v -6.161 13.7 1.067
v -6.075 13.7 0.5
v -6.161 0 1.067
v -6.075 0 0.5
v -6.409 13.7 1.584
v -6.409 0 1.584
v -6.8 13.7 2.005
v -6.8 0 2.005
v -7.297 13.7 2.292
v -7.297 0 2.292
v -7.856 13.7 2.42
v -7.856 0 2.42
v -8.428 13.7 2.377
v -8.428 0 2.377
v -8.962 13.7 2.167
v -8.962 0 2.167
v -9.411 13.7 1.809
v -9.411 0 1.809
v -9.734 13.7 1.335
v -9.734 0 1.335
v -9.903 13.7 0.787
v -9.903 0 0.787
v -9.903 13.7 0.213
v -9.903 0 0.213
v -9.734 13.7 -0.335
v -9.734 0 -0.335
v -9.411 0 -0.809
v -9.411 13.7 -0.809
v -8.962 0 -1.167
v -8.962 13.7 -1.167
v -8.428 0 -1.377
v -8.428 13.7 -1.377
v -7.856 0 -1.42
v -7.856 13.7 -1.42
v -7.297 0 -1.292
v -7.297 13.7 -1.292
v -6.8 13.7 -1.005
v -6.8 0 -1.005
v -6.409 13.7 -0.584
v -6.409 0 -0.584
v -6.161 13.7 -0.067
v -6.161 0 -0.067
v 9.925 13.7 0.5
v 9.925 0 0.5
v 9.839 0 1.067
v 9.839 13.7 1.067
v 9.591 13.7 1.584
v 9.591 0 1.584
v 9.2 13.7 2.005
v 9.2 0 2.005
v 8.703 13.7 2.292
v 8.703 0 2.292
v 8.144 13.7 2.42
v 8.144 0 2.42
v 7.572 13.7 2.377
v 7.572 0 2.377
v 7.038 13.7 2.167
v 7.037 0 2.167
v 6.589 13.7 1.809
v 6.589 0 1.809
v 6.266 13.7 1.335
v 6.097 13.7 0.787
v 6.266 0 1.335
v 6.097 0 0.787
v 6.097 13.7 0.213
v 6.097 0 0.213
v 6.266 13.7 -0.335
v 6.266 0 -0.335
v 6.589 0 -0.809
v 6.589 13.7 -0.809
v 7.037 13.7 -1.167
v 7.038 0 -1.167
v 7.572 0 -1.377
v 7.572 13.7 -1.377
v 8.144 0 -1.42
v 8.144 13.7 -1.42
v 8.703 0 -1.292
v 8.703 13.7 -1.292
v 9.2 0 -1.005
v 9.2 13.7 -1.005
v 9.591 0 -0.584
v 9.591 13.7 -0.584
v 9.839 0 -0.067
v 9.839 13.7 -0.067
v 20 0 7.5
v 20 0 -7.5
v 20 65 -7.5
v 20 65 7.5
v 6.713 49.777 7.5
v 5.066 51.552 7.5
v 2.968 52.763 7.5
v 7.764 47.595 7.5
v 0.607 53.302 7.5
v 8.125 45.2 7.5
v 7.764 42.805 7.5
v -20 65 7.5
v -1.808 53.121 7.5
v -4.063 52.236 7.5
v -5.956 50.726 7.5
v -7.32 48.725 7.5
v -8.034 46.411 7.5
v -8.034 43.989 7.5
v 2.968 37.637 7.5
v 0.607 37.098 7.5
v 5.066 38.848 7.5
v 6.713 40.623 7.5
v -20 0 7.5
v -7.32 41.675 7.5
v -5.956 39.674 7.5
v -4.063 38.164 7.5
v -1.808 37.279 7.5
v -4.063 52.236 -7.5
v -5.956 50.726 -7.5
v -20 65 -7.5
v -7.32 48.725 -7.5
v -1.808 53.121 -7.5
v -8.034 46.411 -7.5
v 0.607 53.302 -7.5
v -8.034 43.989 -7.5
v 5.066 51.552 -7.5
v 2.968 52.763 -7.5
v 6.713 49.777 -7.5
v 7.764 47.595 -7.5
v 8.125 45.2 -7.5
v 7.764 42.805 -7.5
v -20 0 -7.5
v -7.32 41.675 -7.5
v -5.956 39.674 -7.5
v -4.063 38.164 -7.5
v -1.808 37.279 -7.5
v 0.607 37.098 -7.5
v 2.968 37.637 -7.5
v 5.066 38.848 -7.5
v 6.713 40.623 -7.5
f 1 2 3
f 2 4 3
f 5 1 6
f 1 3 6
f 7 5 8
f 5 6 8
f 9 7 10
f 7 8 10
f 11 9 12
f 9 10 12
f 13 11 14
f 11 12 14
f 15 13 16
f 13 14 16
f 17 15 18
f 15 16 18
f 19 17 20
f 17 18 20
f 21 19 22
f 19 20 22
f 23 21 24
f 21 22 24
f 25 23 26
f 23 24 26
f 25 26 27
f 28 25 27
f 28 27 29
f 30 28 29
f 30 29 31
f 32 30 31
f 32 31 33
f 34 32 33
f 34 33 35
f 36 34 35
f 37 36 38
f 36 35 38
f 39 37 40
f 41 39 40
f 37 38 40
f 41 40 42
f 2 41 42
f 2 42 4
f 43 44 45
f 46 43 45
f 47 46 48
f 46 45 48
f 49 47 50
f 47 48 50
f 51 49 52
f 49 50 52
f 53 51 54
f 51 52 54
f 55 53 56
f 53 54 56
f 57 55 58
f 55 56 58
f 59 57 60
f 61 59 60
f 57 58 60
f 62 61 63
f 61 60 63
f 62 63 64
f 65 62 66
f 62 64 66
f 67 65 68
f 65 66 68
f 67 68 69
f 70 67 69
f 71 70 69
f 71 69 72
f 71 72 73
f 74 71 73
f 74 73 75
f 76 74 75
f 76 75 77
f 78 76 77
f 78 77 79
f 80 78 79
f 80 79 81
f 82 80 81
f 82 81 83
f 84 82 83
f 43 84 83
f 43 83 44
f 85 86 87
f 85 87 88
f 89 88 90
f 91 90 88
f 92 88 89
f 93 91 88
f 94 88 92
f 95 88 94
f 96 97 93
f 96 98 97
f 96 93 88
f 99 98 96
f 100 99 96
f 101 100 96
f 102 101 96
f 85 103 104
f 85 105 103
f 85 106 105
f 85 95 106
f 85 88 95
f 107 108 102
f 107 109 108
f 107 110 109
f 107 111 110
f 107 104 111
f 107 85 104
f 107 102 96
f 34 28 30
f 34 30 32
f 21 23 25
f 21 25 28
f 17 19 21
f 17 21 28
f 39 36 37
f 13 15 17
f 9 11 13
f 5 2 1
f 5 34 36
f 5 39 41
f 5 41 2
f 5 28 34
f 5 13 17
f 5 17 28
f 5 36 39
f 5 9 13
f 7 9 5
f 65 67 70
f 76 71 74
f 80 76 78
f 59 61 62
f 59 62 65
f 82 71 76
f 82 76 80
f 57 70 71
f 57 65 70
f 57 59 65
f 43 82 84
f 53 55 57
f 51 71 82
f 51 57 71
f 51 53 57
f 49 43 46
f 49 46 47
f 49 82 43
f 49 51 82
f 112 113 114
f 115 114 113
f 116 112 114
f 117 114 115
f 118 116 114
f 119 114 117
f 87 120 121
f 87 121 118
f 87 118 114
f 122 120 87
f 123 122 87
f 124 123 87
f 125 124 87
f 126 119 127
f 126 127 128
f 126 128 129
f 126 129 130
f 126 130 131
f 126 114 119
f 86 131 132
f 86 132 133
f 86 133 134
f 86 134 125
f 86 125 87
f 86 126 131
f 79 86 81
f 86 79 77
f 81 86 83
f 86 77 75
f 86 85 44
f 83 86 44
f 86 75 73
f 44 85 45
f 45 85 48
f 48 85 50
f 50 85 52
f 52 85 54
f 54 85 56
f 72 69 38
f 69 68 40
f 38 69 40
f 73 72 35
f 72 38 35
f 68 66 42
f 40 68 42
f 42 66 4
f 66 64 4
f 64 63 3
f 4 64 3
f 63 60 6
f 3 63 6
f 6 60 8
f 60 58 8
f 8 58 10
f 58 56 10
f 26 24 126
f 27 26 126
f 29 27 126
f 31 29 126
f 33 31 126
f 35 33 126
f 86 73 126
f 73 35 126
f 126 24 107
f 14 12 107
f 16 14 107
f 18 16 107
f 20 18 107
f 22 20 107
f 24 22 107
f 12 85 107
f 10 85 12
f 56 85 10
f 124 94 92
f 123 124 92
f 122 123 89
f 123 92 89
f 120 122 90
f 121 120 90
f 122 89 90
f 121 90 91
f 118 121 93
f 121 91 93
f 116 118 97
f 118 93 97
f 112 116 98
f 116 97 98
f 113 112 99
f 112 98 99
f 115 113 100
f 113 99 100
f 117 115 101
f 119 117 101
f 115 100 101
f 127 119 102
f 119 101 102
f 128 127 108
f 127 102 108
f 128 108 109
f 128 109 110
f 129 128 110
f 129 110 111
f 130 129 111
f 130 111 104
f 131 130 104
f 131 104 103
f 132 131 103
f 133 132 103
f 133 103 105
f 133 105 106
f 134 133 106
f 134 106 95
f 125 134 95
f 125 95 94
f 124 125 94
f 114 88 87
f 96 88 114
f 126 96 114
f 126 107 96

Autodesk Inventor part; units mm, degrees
ref_plane "YZ Plane" through (0, 0, 0) normal (1, 0, 0) x (0, 1, 0)
ref_plane "XZ Plane" through (0, 0, 0) normal (0, 1, 0) x (-1, 0, 0)
ref_plane "XY Plane" through (0, 0, 0) normal (0, 0, 1) x (1, 0, 0)
sketch "Sketch1" plane through (0, 0, 0) normal (0, 1, 0) x (-1, 0, 0)
  line L0 (20, -7.5) -> (-20, -7.5)
  line L1 (-20, -7.5) -> (-20, 7.5)
  line L2 (-20, 7.5) -> (20, 7.5)
  line L3 (20, 7.5) -> (20, -7.5)
  point P0 (0, 0)
  dimension "d0" = 40
  dimension "d1" = 15
  dimension "d2" = 7.5
  dimension "d3" = 20
extrude "Extrusion1" add sketch "Sketch1" along normal blind 65
sketch "Sketch2" plane through (0, 0, 0) normal (0, -1, 0) x (1, 0, 0)
  line L0 (0, 0) -> (0, 0.5)
  line L1 (0, 0.5) -> (8, 0.5)
  line L2 (0, 0.5) -> (-8, 0.5)
  circle A0 centre (-8, 0.5) radius 1.925
  circle A1 centre (8, 0.5) radius 1.925
  dimension "d21" = 0.5
  dimension "d22" = 8
  dimension "d23" = 8
  dimension "d24" = 3.85
  dimension "d25" = 3.85
extrude "Extrusion2" cut sketch "Sketch2" against normal blind 13.7
sketch "Sketch3" plane through (-20, 0, 7.5) normal (0, 0, 1) x (1, 0, 0)
  line L0 (20, 0) -> (20, 45.2)
  circle A0 centre (20, 45.2) radius 8.125
  dimension "d12" = 45.2
  dimension "d13" = 16.25
extrude "Extrusion3" cut sketch "Sketch3" against normal blind 20
properties part number "OmniSupportFront"
